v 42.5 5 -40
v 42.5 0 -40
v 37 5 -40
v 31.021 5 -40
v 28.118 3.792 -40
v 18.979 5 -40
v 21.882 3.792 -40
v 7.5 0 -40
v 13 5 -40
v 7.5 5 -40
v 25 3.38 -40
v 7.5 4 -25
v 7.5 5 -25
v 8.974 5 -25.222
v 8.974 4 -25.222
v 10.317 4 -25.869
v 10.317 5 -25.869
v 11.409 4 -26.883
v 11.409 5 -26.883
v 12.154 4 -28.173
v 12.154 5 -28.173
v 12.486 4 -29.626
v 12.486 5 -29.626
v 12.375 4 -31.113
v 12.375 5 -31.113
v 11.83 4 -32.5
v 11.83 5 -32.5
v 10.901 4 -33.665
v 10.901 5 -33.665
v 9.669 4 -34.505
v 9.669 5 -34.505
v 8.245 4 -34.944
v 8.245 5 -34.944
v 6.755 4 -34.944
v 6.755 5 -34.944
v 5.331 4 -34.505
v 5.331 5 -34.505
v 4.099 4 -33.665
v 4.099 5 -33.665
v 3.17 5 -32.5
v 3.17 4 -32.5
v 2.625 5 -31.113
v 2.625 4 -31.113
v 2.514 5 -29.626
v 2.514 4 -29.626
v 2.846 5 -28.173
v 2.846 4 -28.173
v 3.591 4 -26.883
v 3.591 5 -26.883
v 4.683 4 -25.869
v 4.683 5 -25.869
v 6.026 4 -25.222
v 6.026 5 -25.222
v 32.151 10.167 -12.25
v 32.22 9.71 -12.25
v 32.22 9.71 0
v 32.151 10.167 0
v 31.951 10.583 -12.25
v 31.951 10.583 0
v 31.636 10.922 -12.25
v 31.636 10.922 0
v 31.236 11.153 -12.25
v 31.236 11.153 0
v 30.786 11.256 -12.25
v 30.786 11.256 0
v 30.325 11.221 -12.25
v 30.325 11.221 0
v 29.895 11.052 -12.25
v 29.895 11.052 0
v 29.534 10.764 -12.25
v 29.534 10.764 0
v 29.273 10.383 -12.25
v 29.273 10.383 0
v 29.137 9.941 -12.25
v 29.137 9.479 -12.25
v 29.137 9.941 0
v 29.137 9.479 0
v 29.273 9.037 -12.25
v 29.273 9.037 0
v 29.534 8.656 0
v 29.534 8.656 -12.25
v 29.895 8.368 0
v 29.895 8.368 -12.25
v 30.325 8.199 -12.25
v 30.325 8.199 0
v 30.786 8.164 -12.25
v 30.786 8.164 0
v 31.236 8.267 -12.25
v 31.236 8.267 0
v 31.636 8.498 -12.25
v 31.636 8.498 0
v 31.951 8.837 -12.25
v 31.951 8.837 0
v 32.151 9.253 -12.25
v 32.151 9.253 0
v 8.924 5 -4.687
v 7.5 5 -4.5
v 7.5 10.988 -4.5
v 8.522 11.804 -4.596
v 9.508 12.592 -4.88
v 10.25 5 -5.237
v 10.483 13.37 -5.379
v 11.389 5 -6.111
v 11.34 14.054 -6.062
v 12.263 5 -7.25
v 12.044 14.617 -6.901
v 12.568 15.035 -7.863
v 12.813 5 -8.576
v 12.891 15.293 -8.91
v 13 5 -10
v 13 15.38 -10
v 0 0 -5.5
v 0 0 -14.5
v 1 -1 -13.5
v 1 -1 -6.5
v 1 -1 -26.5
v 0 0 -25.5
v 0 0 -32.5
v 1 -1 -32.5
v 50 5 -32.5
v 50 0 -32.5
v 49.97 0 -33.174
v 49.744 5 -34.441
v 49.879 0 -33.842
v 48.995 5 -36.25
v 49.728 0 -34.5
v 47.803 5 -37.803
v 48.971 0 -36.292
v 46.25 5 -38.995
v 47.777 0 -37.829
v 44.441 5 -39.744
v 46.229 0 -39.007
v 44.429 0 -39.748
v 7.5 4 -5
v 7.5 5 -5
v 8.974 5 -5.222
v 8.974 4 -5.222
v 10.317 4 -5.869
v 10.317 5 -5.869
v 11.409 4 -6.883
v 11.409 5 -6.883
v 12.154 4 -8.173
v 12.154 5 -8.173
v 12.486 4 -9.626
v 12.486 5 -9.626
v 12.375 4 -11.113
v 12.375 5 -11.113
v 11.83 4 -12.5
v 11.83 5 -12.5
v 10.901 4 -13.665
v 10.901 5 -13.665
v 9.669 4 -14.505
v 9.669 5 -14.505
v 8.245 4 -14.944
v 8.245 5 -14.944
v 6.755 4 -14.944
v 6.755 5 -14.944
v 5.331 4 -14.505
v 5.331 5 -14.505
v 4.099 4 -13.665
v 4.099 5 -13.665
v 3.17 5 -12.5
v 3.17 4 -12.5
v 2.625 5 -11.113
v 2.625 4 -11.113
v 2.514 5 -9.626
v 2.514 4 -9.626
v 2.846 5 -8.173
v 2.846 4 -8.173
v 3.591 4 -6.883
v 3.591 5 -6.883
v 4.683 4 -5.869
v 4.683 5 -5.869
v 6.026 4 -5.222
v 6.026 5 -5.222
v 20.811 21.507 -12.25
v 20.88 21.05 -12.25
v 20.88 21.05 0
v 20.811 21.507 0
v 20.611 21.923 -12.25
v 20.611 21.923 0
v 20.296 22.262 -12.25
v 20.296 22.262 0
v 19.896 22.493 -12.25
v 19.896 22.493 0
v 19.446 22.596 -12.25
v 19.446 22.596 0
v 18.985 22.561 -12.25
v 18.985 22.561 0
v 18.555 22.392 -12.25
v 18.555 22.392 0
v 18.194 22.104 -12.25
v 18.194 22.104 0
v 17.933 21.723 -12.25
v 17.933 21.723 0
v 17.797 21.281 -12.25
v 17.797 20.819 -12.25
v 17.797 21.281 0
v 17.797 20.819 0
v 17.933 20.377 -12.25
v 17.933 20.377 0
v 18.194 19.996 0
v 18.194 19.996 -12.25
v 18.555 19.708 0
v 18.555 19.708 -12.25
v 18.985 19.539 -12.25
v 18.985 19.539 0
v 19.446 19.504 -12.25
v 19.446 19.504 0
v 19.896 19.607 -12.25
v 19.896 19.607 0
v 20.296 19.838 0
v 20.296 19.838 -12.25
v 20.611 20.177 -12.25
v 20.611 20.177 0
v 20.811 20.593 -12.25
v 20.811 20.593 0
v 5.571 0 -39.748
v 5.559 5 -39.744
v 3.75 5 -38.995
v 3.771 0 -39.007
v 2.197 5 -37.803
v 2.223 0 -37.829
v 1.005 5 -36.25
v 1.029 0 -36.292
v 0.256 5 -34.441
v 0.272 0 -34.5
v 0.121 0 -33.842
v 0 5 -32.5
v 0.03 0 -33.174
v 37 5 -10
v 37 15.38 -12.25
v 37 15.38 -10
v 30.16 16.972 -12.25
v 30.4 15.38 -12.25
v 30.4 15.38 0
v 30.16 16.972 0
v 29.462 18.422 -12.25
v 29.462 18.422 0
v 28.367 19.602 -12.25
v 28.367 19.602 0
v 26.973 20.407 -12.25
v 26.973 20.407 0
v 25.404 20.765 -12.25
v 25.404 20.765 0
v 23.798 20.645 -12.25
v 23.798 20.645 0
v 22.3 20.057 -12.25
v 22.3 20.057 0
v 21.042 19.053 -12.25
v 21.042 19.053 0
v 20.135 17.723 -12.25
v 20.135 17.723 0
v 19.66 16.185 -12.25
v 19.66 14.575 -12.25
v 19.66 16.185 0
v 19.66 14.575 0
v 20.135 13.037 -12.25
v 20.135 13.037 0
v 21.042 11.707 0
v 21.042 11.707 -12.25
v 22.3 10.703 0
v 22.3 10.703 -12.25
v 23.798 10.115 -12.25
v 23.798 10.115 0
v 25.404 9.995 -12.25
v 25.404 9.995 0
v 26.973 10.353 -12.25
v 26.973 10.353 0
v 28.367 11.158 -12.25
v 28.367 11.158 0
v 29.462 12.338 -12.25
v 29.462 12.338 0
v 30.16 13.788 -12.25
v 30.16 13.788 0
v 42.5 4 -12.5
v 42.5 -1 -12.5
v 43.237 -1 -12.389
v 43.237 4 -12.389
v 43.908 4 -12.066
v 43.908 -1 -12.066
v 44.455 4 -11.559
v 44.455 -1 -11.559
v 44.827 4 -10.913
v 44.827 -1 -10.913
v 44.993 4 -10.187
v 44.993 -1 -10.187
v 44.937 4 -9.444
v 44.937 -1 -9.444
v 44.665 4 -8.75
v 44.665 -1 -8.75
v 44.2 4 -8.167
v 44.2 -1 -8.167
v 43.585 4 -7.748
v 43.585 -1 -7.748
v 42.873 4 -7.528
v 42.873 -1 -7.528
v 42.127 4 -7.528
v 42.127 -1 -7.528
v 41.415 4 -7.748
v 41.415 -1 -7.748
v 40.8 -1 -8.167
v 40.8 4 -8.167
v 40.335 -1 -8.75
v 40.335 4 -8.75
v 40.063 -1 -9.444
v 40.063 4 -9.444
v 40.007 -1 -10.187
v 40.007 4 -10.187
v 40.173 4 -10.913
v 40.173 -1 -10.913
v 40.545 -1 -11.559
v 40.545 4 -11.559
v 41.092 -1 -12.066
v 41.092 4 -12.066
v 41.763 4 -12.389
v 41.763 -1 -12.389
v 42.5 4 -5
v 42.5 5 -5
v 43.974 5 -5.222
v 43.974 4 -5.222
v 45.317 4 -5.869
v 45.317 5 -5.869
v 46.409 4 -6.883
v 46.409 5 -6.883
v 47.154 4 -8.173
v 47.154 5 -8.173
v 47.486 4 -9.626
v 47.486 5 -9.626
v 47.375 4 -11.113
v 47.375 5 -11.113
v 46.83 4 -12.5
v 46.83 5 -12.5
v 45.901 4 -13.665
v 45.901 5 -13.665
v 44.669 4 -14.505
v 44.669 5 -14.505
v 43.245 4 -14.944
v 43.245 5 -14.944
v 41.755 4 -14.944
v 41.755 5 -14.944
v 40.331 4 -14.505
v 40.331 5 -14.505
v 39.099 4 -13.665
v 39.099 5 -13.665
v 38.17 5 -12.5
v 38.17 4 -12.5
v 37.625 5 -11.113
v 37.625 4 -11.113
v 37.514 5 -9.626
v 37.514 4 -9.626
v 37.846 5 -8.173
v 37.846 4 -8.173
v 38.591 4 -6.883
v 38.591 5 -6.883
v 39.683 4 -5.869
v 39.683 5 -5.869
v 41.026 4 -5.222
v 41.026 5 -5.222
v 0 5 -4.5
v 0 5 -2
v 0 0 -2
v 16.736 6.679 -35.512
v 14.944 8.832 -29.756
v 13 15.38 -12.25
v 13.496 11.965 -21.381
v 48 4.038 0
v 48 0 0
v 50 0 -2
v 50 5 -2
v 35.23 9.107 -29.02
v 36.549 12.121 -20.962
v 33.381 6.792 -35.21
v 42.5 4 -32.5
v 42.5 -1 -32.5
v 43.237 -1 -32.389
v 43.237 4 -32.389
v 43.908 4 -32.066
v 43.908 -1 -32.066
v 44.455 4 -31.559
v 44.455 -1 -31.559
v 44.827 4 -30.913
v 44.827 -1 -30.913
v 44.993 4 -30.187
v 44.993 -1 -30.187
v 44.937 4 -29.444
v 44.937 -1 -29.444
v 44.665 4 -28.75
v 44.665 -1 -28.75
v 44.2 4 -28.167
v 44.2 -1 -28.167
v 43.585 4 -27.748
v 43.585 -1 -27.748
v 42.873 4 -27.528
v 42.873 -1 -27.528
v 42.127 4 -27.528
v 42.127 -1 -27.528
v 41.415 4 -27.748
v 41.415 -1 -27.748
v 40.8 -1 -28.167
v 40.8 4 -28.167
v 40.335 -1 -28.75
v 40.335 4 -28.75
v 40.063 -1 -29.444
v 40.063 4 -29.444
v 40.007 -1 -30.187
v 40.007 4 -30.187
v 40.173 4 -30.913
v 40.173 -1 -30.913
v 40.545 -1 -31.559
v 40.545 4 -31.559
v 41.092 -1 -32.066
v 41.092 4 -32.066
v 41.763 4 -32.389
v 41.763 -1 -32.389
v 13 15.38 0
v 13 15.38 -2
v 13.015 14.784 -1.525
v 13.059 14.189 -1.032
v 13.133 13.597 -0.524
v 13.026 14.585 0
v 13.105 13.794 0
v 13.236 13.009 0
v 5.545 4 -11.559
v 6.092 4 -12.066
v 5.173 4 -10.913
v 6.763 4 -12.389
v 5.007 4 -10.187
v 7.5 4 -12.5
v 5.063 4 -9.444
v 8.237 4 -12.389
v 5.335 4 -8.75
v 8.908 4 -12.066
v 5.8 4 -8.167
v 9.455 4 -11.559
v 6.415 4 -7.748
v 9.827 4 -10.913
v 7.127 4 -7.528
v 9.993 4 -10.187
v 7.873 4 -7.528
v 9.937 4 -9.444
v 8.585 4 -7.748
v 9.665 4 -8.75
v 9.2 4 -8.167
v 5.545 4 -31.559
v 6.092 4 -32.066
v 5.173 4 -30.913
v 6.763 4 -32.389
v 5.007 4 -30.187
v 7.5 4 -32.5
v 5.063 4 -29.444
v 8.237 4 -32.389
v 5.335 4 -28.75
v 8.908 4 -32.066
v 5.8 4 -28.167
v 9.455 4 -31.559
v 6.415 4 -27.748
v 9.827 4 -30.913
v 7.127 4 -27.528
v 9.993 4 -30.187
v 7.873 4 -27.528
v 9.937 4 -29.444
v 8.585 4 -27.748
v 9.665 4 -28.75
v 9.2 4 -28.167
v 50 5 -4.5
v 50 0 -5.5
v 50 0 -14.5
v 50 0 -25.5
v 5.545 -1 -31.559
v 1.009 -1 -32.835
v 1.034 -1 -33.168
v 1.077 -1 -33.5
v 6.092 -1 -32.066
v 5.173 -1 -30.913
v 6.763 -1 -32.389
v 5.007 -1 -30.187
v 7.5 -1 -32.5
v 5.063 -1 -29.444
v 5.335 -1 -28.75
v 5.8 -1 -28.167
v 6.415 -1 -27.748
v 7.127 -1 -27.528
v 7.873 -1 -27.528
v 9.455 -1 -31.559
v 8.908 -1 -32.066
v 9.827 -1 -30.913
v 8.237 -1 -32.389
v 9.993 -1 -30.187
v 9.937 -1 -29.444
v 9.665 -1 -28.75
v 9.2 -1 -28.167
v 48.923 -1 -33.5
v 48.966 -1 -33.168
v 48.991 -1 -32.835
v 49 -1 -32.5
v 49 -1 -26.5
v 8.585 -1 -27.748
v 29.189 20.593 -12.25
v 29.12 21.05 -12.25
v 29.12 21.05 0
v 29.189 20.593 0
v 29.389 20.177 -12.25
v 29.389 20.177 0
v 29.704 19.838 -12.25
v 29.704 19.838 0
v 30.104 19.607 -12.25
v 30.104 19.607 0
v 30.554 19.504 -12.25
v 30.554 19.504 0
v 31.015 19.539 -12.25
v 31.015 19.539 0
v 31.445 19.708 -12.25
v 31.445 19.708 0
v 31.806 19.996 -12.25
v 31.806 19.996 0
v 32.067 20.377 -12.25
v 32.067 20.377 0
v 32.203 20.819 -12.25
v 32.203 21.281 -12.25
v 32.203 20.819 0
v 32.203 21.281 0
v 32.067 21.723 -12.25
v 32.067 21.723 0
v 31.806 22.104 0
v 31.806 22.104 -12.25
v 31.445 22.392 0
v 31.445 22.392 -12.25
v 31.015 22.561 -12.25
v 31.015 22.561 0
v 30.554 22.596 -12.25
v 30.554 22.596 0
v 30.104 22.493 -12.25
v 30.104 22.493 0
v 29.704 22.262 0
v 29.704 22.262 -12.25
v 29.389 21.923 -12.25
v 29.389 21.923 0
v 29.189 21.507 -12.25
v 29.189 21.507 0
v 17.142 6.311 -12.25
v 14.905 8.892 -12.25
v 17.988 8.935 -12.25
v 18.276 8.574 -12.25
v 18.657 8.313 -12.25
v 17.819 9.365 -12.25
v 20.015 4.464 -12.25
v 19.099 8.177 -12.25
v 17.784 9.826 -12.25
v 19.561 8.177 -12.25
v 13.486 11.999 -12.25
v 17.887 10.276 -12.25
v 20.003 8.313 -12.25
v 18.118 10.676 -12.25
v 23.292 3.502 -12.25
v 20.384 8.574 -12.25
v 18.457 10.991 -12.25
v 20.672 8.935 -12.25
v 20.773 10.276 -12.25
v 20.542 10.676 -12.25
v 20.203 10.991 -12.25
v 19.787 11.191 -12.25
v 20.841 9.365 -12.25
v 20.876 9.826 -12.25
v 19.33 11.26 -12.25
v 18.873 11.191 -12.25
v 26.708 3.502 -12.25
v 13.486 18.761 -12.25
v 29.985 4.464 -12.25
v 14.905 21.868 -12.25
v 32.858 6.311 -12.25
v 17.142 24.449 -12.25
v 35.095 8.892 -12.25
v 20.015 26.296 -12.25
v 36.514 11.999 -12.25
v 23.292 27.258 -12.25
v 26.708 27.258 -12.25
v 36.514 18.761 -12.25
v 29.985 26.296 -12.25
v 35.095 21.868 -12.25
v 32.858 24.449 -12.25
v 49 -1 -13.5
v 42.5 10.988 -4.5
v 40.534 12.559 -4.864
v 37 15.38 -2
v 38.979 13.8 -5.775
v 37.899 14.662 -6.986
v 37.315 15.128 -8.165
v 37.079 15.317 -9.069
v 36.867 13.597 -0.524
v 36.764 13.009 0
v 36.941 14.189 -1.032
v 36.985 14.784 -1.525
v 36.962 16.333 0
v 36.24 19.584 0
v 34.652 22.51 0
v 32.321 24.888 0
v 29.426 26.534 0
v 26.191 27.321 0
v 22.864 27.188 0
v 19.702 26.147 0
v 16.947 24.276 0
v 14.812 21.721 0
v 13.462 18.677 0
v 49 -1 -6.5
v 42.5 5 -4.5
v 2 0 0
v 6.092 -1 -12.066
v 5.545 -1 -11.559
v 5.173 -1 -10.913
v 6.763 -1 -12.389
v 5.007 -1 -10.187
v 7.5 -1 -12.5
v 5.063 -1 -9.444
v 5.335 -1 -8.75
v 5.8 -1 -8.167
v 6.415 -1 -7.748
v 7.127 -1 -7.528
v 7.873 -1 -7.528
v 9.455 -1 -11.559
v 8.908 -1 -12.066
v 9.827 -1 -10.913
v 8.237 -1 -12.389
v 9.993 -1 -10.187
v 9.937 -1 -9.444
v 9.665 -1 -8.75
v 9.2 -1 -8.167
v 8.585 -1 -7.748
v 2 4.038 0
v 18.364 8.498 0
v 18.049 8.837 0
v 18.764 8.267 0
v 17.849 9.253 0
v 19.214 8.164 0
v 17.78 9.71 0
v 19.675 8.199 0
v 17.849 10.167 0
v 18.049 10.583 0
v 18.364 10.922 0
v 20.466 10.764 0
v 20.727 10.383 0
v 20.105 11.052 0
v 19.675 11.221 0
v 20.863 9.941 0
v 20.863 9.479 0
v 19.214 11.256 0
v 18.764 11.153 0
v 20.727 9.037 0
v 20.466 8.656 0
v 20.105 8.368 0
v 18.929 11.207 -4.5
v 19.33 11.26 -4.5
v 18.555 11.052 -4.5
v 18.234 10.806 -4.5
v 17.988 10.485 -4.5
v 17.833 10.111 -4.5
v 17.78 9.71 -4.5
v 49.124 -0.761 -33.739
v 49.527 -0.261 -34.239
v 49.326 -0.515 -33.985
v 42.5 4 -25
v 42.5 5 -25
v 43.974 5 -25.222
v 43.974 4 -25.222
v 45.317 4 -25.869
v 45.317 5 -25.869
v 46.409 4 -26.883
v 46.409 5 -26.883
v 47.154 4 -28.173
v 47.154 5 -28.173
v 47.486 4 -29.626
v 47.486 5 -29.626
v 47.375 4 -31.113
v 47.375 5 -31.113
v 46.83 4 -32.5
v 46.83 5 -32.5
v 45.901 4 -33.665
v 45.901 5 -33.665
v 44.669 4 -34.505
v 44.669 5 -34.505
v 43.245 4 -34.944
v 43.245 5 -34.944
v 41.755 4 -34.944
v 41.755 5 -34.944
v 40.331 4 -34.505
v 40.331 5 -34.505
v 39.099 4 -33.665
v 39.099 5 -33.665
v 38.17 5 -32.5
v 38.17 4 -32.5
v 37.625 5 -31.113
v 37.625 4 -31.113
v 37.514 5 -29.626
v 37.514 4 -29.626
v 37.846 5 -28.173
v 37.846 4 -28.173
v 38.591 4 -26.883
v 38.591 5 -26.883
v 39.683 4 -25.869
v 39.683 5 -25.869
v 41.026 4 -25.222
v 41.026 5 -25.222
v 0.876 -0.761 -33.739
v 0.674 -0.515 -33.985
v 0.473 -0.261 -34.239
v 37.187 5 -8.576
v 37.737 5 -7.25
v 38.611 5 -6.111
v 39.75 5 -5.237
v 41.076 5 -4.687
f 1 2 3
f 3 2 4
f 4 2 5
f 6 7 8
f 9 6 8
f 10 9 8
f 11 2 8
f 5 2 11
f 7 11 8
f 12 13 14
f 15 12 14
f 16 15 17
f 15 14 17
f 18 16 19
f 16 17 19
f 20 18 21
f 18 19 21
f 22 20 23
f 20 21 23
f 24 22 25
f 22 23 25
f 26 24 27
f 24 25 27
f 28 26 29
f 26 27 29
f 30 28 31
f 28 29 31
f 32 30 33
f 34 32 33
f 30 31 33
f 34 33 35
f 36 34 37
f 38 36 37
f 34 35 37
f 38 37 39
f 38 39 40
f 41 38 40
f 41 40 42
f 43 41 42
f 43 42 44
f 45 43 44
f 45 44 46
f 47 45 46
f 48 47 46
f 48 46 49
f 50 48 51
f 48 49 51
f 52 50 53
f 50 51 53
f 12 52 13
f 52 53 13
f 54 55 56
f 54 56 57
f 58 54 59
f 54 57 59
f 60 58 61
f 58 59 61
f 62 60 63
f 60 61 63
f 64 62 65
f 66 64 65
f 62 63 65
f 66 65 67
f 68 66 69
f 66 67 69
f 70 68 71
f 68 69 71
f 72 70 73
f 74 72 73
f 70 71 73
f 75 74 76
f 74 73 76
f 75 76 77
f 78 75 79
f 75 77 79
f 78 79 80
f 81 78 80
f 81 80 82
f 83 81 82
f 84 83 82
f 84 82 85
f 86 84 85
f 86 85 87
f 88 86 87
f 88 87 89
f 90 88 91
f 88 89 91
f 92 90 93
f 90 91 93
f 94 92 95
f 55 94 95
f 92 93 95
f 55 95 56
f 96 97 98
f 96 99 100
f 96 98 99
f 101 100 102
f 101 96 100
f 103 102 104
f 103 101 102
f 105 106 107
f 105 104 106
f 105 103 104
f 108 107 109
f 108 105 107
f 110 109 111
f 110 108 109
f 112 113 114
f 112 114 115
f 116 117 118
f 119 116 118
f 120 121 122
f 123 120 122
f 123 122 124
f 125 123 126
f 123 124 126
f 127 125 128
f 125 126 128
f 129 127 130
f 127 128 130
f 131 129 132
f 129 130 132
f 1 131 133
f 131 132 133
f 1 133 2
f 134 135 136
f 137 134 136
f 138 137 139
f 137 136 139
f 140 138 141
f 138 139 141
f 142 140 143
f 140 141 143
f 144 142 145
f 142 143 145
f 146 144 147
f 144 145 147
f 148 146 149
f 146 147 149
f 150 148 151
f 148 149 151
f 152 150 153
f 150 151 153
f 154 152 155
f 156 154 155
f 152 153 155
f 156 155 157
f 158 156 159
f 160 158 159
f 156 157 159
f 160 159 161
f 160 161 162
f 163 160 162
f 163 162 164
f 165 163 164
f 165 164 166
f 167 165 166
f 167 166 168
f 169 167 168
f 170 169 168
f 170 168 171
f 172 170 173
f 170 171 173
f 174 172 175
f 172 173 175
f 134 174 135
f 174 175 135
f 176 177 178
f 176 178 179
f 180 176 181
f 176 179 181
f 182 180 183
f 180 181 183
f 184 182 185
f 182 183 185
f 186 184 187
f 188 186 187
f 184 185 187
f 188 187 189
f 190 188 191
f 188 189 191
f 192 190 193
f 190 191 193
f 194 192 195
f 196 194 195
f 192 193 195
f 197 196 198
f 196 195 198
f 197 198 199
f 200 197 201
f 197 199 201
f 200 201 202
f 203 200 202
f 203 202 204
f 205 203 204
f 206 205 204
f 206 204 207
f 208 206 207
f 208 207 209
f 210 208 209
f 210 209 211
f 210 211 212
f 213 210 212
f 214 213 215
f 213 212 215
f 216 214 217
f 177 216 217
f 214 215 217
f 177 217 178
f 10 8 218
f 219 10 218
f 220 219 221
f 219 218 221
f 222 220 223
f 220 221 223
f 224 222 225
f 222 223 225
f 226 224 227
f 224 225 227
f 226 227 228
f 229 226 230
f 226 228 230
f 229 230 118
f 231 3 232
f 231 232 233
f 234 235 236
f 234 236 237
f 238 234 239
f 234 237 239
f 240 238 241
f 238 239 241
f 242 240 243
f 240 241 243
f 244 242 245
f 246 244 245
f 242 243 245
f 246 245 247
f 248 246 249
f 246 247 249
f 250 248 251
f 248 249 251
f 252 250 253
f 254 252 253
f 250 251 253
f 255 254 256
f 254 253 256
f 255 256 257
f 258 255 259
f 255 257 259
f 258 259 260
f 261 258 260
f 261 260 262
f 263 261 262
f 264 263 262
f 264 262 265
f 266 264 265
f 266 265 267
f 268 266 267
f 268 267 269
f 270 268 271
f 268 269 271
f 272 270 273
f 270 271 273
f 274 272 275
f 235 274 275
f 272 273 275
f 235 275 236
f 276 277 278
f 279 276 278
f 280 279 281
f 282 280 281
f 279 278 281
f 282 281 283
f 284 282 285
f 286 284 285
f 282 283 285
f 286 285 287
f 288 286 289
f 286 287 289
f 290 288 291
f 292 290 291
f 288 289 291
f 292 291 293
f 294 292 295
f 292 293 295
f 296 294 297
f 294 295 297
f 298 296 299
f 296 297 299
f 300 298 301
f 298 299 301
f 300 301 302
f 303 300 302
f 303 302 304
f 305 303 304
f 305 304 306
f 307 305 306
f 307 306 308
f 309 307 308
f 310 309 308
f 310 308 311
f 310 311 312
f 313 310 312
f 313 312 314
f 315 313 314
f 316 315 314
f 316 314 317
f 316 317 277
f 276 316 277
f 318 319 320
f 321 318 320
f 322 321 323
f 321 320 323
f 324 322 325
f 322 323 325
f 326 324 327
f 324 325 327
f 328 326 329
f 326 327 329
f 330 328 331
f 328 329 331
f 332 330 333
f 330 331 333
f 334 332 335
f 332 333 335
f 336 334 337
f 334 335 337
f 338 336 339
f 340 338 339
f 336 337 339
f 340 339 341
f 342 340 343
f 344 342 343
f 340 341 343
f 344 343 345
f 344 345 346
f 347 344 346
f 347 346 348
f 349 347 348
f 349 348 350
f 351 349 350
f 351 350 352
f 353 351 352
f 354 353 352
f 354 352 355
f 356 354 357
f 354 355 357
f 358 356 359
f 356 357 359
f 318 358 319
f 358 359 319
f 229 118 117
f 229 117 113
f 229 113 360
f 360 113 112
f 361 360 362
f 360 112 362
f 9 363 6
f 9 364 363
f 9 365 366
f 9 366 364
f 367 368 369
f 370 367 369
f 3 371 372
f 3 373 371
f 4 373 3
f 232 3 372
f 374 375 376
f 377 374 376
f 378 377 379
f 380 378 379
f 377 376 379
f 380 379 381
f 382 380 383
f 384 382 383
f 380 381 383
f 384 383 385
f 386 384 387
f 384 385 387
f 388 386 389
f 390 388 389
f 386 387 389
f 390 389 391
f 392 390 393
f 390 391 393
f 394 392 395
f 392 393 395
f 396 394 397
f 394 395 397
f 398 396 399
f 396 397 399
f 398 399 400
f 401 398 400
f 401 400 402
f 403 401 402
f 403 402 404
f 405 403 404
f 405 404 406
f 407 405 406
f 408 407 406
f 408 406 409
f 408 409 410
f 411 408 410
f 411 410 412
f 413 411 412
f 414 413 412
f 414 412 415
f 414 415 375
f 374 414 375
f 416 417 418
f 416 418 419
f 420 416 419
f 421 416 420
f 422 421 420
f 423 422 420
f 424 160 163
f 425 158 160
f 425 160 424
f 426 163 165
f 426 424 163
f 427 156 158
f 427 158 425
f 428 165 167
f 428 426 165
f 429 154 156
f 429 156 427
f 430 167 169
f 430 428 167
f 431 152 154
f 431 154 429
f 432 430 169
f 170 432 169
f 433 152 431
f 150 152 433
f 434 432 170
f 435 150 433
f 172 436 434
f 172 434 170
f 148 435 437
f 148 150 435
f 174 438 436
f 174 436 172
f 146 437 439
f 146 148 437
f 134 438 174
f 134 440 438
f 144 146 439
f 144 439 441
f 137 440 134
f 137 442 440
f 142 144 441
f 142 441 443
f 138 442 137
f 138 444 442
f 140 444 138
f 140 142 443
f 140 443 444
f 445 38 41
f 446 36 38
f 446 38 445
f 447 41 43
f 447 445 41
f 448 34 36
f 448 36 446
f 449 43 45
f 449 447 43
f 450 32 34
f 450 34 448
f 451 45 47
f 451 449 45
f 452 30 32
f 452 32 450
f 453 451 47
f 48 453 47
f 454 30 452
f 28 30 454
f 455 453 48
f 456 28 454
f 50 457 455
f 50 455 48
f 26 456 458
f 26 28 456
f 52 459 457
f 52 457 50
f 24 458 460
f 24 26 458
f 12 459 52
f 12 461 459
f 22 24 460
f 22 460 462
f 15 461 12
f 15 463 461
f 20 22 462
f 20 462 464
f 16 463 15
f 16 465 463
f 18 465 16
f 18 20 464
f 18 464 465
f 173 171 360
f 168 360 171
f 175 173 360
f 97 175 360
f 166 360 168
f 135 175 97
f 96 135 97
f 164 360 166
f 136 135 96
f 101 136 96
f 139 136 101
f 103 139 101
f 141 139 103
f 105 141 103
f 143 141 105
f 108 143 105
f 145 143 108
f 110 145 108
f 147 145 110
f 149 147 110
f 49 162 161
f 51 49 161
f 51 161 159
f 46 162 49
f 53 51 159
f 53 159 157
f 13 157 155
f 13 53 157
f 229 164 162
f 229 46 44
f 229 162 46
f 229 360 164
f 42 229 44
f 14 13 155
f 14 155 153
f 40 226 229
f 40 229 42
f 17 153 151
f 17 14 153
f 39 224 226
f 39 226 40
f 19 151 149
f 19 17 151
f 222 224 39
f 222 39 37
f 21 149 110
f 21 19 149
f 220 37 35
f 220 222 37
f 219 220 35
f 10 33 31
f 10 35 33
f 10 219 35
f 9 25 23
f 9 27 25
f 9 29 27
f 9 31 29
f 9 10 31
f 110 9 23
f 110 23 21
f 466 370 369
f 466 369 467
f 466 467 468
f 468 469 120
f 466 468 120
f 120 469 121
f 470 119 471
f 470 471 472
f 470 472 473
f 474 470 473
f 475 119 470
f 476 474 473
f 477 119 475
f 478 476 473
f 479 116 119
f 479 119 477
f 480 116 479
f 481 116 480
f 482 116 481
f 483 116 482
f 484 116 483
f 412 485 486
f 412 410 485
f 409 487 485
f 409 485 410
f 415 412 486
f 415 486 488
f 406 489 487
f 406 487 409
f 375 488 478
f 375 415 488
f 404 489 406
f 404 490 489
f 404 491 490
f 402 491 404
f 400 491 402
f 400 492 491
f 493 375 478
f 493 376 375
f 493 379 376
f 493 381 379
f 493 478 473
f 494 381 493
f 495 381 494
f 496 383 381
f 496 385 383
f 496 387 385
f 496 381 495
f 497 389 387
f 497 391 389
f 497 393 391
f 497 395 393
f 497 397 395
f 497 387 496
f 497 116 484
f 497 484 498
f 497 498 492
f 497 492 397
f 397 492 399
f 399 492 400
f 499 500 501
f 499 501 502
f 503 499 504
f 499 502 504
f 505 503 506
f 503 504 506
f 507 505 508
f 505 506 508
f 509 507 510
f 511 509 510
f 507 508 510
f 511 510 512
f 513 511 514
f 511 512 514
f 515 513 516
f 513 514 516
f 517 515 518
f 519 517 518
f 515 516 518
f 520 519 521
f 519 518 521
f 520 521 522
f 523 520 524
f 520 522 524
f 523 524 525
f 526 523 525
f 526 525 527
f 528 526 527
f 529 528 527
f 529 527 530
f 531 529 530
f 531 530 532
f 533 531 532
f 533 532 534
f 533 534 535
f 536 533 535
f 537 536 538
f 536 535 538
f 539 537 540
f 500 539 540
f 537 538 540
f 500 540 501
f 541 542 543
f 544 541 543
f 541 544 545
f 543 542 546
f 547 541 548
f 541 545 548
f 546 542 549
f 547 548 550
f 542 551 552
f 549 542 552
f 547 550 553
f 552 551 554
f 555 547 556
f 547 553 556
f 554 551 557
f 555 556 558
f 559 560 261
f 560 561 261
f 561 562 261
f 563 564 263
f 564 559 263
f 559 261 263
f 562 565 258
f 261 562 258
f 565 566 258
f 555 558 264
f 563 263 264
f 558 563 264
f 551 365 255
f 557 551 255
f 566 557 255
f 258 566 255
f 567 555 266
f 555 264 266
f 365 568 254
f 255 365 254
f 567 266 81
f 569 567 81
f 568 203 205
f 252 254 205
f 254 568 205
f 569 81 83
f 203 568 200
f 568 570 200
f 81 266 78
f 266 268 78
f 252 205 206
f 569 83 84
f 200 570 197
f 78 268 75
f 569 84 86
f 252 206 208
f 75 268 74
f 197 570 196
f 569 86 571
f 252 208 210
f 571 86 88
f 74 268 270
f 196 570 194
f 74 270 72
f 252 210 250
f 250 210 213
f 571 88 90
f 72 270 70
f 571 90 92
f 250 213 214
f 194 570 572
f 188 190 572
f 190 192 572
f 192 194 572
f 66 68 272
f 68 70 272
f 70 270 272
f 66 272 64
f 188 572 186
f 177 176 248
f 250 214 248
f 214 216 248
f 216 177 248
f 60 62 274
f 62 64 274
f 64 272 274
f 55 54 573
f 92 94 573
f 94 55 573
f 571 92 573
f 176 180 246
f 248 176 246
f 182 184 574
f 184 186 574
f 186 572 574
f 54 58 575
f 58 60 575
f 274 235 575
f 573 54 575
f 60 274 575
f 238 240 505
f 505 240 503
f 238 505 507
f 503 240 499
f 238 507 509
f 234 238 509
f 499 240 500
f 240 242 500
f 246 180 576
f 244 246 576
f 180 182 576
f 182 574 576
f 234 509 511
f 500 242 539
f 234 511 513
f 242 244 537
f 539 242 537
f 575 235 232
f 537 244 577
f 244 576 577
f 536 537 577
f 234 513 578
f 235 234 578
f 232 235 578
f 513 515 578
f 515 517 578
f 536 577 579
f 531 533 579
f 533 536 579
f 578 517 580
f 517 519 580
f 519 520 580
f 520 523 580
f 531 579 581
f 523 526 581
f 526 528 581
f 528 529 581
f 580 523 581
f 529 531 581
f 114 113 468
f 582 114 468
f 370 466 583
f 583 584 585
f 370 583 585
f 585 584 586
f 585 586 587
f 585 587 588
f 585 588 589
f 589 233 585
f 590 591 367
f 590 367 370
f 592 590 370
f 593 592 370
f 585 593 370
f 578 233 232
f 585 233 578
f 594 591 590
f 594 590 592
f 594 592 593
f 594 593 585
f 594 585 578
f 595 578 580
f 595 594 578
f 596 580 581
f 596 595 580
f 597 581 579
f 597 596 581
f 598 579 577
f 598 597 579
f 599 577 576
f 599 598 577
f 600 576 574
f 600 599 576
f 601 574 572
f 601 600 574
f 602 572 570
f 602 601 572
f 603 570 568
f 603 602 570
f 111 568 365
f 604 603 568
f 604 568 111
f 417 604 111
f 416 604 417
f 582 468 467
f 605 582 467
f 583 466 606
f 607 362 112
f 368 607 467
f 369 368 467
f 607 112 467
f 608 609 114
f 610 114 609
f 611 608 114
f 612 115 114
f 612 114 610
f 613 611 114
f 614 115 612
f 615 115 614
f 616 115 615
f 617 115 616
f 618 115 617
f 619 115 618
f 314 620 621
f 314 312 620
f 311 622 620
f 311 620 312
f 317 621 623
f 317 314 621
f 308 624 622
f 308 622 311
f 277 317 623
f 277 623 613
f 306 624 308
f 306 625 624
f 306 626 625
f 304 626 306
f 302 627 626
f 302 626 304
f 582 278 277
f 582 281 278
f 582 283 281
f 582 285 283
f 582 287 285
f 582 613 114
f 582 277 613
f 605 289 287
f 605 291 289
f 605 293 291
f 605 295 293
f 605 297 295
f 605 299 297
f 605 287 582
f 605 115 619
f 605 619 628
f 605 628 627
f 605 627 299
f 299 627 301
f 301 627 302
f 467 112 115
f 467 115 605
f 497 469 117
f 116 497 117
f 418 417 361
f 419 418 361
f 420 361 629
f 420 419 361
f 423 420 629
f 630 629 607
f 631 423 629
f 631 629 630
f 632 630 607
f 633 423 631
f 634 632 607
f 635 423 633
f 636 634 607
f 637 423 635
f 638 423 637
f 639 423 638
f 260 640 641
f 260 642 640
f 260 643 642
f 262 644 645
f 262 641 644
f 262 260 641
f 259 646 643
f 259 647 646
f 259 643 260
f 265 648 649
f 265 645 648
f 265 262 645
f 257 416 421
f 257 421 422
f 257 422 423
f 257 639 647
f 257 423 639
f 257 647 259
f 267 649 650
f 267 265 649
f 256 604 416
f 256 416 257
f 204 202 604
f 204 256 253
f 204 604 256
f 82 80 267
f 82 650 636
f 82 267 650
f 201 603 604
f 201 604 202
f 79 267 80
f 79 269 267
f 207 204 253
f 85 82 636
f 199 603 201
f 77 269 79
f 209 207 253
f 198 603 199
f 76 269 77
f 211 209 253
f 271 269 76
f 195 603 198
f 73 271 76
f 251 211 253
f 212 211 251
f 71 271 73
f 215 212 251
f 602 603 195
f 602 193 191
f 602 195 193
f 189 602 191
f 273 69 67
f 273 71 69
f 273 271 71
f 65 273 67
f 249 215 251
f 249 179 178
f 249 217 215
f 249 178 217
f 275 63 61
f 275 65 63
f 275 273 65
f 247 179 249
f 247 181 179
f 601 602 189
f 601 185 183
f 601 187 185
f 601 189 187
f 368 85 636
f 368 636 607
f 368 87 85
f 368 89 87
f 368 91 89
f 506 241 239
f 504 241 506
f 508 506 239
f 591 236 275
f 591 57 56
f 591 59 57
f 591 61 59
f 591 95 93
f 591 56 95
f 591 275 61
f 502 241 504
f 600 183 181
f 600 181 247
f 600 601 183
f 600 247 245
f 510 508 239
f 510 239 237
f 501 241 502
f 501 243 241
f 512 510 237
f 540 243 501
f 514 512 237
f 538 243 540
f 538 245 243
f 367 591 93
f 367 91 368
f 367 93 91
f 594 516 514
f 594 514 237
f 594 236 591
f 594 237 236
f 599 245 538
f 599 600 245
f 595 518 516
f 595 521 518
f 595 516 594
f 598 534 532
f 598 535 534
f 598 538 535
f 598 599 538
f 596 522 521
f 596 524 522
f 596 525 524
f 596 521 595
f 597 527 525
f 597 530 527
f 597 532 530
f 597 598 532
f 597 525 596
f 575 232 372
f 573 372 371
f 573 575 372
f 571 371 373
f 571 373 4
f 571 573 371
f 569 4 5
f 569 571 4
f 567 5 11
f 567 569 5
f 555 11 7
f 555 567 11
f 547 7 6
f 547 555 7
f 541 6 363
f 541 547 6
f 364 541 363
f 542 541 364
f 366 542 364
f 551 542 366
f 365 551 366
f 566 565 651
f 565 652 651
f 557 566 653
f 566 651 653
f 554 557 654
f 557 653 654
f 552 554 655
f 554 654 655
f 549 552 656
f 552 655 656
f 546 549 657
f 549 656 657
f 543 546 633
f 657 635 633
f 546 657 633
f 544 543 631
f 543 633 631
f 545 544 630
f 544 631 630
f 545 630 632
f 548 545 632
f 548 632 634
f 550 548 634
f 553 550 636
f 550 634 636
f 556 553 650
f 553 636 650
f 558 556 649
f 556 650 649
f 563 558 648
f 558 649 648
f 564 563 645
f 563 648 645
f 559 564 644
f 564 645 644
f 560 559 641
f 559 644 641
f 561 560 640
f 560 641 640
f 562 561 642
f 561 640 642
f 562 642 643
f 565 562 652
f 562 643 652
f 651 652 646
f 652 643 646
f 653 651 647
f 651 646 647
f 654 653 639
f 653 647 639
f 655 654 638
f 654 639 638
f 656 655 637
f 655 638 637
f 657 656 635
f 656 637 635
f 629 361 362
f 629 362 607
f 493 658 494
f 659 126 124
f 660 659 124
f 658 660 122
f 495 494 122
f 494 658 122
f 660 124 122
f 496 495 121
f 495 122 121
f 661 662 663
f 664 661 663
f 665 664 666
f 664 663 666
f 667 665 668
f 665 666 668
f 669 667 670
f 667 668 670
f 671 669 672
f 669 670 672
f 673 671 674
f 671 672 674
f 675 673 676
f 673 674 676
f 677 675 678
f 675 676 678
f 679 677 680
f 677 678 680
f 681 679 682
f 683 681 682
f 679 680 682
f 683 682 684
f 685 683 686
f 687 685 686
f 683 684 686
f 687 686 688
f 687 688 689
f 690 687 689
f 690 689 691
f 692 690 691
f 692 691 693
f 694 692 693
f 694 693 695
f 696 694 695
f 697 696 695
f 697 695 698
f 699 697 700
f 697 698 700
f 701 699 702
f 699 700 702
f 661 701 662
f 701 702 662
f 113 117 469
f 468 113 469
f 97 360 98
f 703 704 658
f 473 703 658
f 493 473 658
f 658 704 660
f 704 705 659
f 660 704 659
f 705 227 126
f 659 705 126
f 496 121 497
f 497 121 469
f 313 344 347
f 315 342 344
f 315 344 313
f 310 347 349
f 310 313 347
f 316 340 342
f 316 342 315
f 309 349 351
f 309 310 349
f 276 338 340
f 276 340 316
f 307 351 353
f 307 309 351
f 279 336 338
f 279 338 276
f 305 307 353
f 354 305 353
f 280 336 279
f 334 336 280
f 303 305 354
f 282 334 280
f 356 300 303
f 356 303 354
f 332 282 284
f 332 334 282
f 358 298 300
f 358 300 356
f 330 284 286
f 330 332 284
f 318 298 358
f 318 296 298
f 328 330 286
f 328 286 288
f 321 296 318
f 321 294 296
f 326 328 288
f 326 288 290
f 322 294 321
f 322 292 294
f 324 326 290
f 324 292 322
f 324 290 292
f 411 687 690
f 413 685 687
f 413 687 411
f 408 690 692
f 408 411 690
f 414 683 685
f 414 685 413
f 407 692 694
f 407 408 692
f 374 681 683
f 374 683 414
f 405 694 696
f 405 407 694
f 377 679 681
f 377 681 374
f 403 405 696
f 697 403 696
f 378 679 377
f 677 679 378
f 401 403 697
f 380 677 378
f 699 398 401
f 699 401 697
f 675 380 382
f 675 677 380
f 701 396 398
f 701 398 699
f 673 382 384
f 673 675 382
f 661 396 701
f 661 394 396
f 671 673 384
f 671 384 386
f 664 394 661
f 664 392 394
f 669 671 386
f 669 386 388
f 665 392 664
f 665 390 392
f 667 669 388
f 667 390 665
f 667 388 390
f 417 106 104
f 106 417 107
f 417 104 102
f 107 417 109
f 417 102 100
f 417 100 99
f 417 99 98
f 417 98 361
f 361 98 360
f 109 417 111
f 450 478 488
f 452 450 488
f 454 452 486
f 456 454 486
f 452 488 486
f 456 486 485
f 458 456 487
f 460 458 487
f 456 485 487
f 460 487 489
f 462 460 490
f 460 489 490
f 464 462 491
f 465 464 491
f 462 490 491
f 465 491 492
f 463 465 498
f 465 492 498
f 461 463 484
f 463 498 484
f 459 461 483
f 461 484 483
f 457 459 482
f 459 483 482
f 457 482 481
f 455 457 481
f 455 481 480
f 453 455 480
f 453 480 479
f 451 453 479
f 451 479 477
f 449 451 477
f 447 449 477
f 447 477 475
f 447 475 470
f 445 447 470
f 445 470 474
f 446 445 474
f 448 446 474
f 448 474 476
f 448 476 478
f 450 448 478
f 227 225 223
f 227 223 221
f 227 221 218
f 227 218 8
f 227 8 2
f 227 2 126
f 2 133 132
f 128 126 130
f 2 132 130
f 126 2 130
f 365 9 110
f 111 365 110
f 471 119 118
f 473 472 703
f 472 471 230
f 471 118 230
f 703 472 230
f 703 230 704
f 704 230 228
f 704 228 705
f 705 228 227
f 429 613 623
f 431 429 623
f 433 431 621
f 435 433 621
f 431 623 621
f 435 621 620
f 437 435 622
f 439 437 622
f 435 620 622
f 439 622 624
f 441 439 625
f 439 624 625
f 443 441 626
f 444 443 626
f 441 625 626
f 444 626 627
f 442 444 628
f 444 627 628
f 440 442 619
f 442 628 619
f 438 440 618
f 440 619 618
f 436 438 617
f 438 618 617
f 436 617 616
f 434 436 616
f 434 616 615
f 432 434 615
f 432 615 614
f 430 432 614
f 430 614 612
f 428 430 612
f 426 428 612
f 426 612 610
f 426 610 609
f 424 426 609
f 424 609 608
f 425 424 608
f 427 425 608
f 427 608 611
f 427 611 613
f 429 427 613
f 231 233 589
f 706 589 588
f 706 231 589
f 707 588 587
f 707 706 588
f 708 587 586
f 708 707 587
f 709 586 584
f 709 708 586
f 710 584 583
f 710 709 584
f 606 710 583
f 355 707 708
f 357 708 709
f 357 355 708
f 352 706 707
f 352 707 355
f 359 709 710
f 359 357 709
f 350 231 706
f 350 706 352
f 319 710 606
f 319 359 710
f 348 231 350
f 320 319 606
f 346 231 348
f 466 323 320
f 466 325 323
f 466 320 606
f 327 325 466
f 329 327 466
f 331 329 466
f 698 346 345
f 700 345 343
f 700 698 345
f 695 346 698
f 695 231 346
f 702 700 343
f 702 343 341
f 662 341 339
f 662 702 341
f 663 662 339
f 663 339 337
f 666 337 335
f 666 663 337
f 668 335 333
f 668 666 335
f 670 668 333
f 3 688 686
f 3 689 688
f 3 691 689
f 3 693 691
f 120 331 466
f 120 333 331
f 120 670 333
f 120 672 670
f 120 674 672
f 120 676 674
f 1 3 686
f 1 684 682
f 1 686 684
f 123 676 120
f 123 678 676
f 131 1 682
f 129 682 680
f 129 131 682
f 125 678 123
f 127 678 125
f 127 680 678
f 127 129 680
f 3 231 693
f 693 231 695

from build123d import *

# Parameters (mm, degrees)
BOSS_EXTRUDE1_DEPTH           = 5
SKETCH2_R                     = 12
SKETCH2_R_2                   = 5.4
SKETCH2_R_3                   = 1.55
BOSS_EXTRUDE2_DEPTH           = 12.25
BOSS_EXTRUDE3_DEPTH           = 4.5
CHAMFER1_SIZE                 = 2
BOSS_EXTRUDE4_DEPTH           = 24
SKETCH5_R                     = 5.4
SKETCH5_R_2                   = 1.55
CUT_EXTRUDE1_DEPTH            = 70.639531877
CUT_EXTRUDE2_START            = -27.75
SKETCH6_R                     = 12
CUT_EXTRUDE2_DEPTH            = 27.75
FILLET1_R                     = 5.5
BOSS_EXTRUDE5_DEPTH           = 1
BOSS_EXTRUDE5_DRAFT           = 45
SKETCH7_W                     = 50
SKETCH7_H                     = 9
BOSS_EXTRUDE5_PROFILE_2_DEPTH = 1
BOSS_EXTRUDE5_PROFILE_2_DRAFT = 45
SKETCH8_R                     = 2.5
CUT_EXTRUDE3_DEPTH            = 71.038734997
SKETCH9_R                     = 5
CUT_EXTRUDE4_DEPTH            = 1


with BuildPart() as part:
    # Sketch1 → Boss-Extrude1 (new body)
    with BuildSketch(Plane(origin=(0, 0, 0), x_dir=(1, 0, 0), z_dir=(0, 1, 0))):
        with BuildLine():
            Line((0, 2), (2, 0))
            Line((2, 0), (48, 0))
            Line((48, 0), (50, 2))
            Line((50, 2), (50, 32.5))
            ThreePointArc((50, 32.5), (47.803300859, 37.803300859), (42.5, 40))
            Line((42.5, 40), (7.5, 40))
            ThreePointArc((7.5, 40), (2.196699141, 37.803300859), (0, 32.5))
            Line((0, 32.5), (0, 2))
        make_face()
    extrude(amount=BOSS_EXTRUDE1_DEPTH)

    # Sketch2 → Boss-Extrude2 (add)
    with BuildSketch(Plane.XY):
        with Locations((25, 15.38)):
            Circle(SKETCH2_R)
        with Locations((25, 15.38)):
            Circle(SKETCH2_R_2, mode=Mode.SUBTRACT)
        with Locations((19.33, 21.05)):
            Circle(SKETCH2_R_3, mode=Mode.SUBTRACT)
        with Locations(Location((30.67, 21.05, 0), (0, 0, 180))):
            Circle(SKETCH2_R_3, mode=Mode.SUBTRACT)
        with Locations((30.67, 9.71)):
            Circle(SKETCH2_R_3, mode=Mode.SUBTRACT)
        with Locations(Location((19.33, 9.71, 0), (0, 0, 180))):
            Circle(SKETCH2_R_3, mode=Mode.SUBTRACT)
    extrude(amount=-BOSS_EXTRUDE2_DEPTH)

    # Sketch3 → Boss-Extrude3 (add)
    with BuildSketch(Plane.XY):
        with BuildLine():
            Line((13, 15.38), (0, 5))
            Line((0, 5), (18.978737674, 5))
            ThreePointArc((18.978737674, 5), (14.601559061, 9.390640598), (13, 15.38))
        make_face()
        with BuildLine():
            Line((50, 5), (31.021262326, 5))
            ThreePointArc((31.021262326, 5), (35.398440939, 9.390640598), (37, 15.38))
            Line((37, 15.38), (50, 5))
        make_face()
    extrude(amount=-BOSS_EXTRUDE3_DEPTH)

    # Chamfer1
    # the kernel refuses this chamfer: 2 mm, written as the material it takes off along each edge
    with BuildSketch(Plane(origin=(32.980691337, 18.589263379, 0), x_dir=(-0.6237257907466237, -0.7811594681797787, 0.027495876610586348), z_dir=(0.7814549230707756, -0.6239617001134351, 0))) as chamfer1_piece_1_section:
        Polygon((CHAMFER1_SIZE * 0.999621916911, CHAMFER1_SIZE * 0.0274958766106), (-CHAMFER1_SIZE * 0.0274958766106, CHAMFER1_SIZE * 0.999621916911), (0, 0), align=None)
    chamfer1_piece_1 = extrude(amount=26.922368399, mode=Mode.PRIVATE)
    chamfer1_piece_1 = chamfer1_piece_1 - Plane(origin=(25, 15.38, -0.663889937), x_dir=(1, 0, 0), z_dir=(0, 0, 1)) * Cylinder(12, 62, mode=Mode.PRIVATE)
    add(chamfer1_piece_1, mode=Mode.SUBTRACT)
    with BuildSketch(Plane(origin=(17.019308663, 18.589263379, 0), x_dir=(-0.017156373916051248, 0.02148678814149, -0.9996219169112968), z_dir=(-0.7814549230707758, -0.6239617001134349, 0))) as chamfer1_piece_2_section:
        Polygon((CHAMFER1_SIZE * 0.999621916911, CHAMFER1_SIZE * 0.0274958766106), (-CHAMFER1_SIZE * 0.0274958766106, CHAMFER1_SIZE * 0.999621916911), (0, 0), align=None)
    chamfer1_piece_2 = extrude(amount=26.922368399, mode=Mode.PRIVATE)
    chamfer1_piece_2 = chamfer1_piece_2 - Plane(origin=(25, 15.38, -0.663889938), x_dir=(1, 0, 0), z_dir=(0, 0, 1)) * Cylinder(12, 62, mode=Mode.PRIVATE)
    add(chamfer1_piece_2, mode=Mode.SUBTRACT)

    # Sketch4 → Boss-Extrude4 (add)
    with BuildSketch(Plane.ZY.offset(-13)):
        Polygon((-40, 5), (-4.5, 5), (-4.5, 15.38), (-12.25, 15.38), align=None)
    extrude(amount=-BOSS_EXTRUDE4_DEPTH)

    # Sketch5 → Cut-Extrude1 (cut, through all)
    with BuildSketch(Plane.XY):
        with Locations((25, 15.38)):
            Circle(SKETCH5_R)
        with Locations((30.67, 9.71)):
            Circle(SKETCH5_R_2)
        with Locations(Location((19.33, 9.71, 0), (0, 0, 90))):
            Circle(SKETCH5_R_2)
    extrude(amount=-CUT_EXTRUDE1_DEPTH, mode=Mode.SUBTRACT)

    # Sketch6 → Cut-Extrude2 (cut)
    with BuildSketch(Plane(origin=(0, 0, -40), x_dir=(-1, 0, 0), z_dir=(0, 0, -1)).offset(CUT_EXTRUDE2_START)):
        with Locations((-25, 15.38)):
            Circle(SKETCH6_R)
    extrude(amount=CUT_EXTRUDE2_DEPTH, mode=Mode.SUBTRACT)

    # Fillet1
    # the kernel refuses this fillet: 5.5 mm, written as the material it adds along each edge
    with BuildSketch(Plane(origin=(13, 5, -4.5), x_dir=(0, 0, -1), z_dir=(0, 1, 0))) as fillet1_piece_1_section:
        with BuildLine():
            CenterArc((FILLET1_R, FILLET1_R), FILLET1_R, 180, 90)
            Line((0, FILLET1_R), (0, 0))
            Line((0, 0), (FILLET1_R, 0))
        make_face()
    fillet1_piece_1 = extrude(amount=24.13, mode=Mode.PRIVATE)
    fillet1_piece_1 = split(fillet1_piece_1, bisect_by=Plane(origin=(9.562905038, 12.635611869, -5.815830527), z_dir=(0.6239617001134349, -0.7814549230707758, 0)), keep=Keep.TOP, mode=Mode.PRIVATE)
    add(fillet1_piece_1)
    with BuildSketch(Plane(origin=(37, 5, -4.5), x_dir=(1, 0, 0), z_dir=(0, 1, 0))) as fillet1_piece_2_section:
        with BuildLine():
            CenterArc((FILLET1_R, FILLET1_R), FILLET1_R, 180, 90)
            Line((0, FILLET1_R), (0, 0))
            Line((0, 0), (FILLET1_R, 0))
        make_face()
    fillet1_piece_2 = extrude(amount=24.13, mode=Mode.PRIVATE)
    fillet1_piece_2 = split(fillet1_piece_2, bisect_by=Plane(origin=(40.437094962, 12.635611869, -5.815830527), z_dir=(-0.6239617001134351, -0.7814549230707756, 0)), keep=Keep.TOP, mode=Mode.PRIVATE)
    add(fillet1_piece_2)


with BuildPart() as boss_extrude5_tool:
    # Sketch7 → Boss-Extrude5 (with draft: the straight prism first)
    with BuildSketch(Plane.XZ):
        with BuildLine():
            Line((0, -25.5), (0, -32.5))
            ThreePointArc((0, -32.5), (0.068206101, -33.509177609), (0.271583853, -34.5))
            Line((0.271583853, -34.5), (49.728416147, -34.5))
            ThreePointArc((49.728416147, -34.5), (49.931793899, -33.509177609), (50, -32.5))
            Line((50, -32.5), (50, -25.5))
            Line((50, -25.5), (0, -25.5))
        make_face()
    extrude(amount=BOSS_EXTRUDE5_DEPTH)
    # Boss-Extrude5: the draft: its side faces are tilted about the plane it starts from
    boss_extrude5_sides = [boss_extrude5_tool.faces().sort_by_distance(p)[0] for p in [
        (0, -0.5, -29),
        (0.068206101, -0.5, -33.509177609),
        (25, -0.5, -34.5),
        (49.931793899, -0.5, -33.509177609),
        (50, -0.5, -29),
        (25, -0.5, -25.5),
    ]]
    draft(boss_extrude5_sides, Plane.XZ, BOSS_EXTRUDE5_DRAFT)


with BuildPart() as part_1:
    add(part.part)

    # Boss-Extrude5: add boss_extrude5_tool
    add(boss_extrude5_tool.part)


with BuildPart() as boss_extrude5_profile_2_tool:
    # Sketch7 → Boss-Extrude5 profile 2 (with draft: the straight prism first)
    with BuildSketch(Plane.XZ):
        with Locations((25, -10)):
            Rectangle(SKETCH7_W, SKETCH7_H)
    extrude(amount=BOSS_EXTRUDE5_PROFILE_2_DEPTH)
    # Boss-Extrude5 profile 2: the draft: its side faces are tilted about the plane it starts from
    boss_extrude5_profile_2_sides = [boss_extrude5_profile_2_tool.faces().sort_by_distance(p)[0] for p in [
        (0, -0.5, -10),
        (25, -0.5, -14.5),
        (50, -0.5, -10),
        (25, -0.5, -5.5),
    ]]
    draft(boss_extrude5_profile_2_sides, Plane.XZ, BOSS_EXTRUDE5_PROFILE_2_DRAFT)


with BuildPart() as part_2:
    add(part_1.part)

    # Boss-Extrude5 profile 2: add boss_extrude5_profile_2_tool
    add(boss_extrude5_profile_2_tool.part)

    # Sketch8 → Cut-Extrude3 (cut, through all)
    with BuildSketch(Plane.XZ.offset(1)):
        with Locations(Location((7.5, -30, 0), (0, 0, 270))):
            Circle(SKETCH8_R)
        with Locations(Location((42.5, -30, 0), (0, 0, 270))):
            Circle(SKETCH8_R)
        with Locations(Location((42.5, -10, 0), (0, 0, 270))):
            Circle(SKETCH8_R)
        with Locations(Location((7.5, -10, 0), (0, 0, 270))):
            Circle(SKETCH8_R)
    extrude(amount=-CUT_EXTRUDE3_DEPTH, mode=Mode.SUBTRACT)

    # Sketch9 → Cut-Extrude4 (cut)
    with BuildSketch(Plane(origin=(0, 5, 0), x_dir=(1, 0, 0), z_dir=(0, 1, 0))):
        with Locations(Location((7.5, 30, 0), (0, 0, 270))):
            Circle(SKETCH9_R)
        with Locations(Location((7.5, 10, 0), (0, 0, 270))):
            Circle(SKETCH9_R)
        with Locations(Location((42.5, 30, 0), (0, 0, 270))):
            Circle(SKETCH9_R)
        with Locations(Location((42.5, 10, 0), (0, 0, 270))):
            Circle(SKETCH9_R)
    extrude(amount=-CUT_EXTRUDE4_DEPTH, mode=Mode.SUBTRACT)


solid = part_2.part
